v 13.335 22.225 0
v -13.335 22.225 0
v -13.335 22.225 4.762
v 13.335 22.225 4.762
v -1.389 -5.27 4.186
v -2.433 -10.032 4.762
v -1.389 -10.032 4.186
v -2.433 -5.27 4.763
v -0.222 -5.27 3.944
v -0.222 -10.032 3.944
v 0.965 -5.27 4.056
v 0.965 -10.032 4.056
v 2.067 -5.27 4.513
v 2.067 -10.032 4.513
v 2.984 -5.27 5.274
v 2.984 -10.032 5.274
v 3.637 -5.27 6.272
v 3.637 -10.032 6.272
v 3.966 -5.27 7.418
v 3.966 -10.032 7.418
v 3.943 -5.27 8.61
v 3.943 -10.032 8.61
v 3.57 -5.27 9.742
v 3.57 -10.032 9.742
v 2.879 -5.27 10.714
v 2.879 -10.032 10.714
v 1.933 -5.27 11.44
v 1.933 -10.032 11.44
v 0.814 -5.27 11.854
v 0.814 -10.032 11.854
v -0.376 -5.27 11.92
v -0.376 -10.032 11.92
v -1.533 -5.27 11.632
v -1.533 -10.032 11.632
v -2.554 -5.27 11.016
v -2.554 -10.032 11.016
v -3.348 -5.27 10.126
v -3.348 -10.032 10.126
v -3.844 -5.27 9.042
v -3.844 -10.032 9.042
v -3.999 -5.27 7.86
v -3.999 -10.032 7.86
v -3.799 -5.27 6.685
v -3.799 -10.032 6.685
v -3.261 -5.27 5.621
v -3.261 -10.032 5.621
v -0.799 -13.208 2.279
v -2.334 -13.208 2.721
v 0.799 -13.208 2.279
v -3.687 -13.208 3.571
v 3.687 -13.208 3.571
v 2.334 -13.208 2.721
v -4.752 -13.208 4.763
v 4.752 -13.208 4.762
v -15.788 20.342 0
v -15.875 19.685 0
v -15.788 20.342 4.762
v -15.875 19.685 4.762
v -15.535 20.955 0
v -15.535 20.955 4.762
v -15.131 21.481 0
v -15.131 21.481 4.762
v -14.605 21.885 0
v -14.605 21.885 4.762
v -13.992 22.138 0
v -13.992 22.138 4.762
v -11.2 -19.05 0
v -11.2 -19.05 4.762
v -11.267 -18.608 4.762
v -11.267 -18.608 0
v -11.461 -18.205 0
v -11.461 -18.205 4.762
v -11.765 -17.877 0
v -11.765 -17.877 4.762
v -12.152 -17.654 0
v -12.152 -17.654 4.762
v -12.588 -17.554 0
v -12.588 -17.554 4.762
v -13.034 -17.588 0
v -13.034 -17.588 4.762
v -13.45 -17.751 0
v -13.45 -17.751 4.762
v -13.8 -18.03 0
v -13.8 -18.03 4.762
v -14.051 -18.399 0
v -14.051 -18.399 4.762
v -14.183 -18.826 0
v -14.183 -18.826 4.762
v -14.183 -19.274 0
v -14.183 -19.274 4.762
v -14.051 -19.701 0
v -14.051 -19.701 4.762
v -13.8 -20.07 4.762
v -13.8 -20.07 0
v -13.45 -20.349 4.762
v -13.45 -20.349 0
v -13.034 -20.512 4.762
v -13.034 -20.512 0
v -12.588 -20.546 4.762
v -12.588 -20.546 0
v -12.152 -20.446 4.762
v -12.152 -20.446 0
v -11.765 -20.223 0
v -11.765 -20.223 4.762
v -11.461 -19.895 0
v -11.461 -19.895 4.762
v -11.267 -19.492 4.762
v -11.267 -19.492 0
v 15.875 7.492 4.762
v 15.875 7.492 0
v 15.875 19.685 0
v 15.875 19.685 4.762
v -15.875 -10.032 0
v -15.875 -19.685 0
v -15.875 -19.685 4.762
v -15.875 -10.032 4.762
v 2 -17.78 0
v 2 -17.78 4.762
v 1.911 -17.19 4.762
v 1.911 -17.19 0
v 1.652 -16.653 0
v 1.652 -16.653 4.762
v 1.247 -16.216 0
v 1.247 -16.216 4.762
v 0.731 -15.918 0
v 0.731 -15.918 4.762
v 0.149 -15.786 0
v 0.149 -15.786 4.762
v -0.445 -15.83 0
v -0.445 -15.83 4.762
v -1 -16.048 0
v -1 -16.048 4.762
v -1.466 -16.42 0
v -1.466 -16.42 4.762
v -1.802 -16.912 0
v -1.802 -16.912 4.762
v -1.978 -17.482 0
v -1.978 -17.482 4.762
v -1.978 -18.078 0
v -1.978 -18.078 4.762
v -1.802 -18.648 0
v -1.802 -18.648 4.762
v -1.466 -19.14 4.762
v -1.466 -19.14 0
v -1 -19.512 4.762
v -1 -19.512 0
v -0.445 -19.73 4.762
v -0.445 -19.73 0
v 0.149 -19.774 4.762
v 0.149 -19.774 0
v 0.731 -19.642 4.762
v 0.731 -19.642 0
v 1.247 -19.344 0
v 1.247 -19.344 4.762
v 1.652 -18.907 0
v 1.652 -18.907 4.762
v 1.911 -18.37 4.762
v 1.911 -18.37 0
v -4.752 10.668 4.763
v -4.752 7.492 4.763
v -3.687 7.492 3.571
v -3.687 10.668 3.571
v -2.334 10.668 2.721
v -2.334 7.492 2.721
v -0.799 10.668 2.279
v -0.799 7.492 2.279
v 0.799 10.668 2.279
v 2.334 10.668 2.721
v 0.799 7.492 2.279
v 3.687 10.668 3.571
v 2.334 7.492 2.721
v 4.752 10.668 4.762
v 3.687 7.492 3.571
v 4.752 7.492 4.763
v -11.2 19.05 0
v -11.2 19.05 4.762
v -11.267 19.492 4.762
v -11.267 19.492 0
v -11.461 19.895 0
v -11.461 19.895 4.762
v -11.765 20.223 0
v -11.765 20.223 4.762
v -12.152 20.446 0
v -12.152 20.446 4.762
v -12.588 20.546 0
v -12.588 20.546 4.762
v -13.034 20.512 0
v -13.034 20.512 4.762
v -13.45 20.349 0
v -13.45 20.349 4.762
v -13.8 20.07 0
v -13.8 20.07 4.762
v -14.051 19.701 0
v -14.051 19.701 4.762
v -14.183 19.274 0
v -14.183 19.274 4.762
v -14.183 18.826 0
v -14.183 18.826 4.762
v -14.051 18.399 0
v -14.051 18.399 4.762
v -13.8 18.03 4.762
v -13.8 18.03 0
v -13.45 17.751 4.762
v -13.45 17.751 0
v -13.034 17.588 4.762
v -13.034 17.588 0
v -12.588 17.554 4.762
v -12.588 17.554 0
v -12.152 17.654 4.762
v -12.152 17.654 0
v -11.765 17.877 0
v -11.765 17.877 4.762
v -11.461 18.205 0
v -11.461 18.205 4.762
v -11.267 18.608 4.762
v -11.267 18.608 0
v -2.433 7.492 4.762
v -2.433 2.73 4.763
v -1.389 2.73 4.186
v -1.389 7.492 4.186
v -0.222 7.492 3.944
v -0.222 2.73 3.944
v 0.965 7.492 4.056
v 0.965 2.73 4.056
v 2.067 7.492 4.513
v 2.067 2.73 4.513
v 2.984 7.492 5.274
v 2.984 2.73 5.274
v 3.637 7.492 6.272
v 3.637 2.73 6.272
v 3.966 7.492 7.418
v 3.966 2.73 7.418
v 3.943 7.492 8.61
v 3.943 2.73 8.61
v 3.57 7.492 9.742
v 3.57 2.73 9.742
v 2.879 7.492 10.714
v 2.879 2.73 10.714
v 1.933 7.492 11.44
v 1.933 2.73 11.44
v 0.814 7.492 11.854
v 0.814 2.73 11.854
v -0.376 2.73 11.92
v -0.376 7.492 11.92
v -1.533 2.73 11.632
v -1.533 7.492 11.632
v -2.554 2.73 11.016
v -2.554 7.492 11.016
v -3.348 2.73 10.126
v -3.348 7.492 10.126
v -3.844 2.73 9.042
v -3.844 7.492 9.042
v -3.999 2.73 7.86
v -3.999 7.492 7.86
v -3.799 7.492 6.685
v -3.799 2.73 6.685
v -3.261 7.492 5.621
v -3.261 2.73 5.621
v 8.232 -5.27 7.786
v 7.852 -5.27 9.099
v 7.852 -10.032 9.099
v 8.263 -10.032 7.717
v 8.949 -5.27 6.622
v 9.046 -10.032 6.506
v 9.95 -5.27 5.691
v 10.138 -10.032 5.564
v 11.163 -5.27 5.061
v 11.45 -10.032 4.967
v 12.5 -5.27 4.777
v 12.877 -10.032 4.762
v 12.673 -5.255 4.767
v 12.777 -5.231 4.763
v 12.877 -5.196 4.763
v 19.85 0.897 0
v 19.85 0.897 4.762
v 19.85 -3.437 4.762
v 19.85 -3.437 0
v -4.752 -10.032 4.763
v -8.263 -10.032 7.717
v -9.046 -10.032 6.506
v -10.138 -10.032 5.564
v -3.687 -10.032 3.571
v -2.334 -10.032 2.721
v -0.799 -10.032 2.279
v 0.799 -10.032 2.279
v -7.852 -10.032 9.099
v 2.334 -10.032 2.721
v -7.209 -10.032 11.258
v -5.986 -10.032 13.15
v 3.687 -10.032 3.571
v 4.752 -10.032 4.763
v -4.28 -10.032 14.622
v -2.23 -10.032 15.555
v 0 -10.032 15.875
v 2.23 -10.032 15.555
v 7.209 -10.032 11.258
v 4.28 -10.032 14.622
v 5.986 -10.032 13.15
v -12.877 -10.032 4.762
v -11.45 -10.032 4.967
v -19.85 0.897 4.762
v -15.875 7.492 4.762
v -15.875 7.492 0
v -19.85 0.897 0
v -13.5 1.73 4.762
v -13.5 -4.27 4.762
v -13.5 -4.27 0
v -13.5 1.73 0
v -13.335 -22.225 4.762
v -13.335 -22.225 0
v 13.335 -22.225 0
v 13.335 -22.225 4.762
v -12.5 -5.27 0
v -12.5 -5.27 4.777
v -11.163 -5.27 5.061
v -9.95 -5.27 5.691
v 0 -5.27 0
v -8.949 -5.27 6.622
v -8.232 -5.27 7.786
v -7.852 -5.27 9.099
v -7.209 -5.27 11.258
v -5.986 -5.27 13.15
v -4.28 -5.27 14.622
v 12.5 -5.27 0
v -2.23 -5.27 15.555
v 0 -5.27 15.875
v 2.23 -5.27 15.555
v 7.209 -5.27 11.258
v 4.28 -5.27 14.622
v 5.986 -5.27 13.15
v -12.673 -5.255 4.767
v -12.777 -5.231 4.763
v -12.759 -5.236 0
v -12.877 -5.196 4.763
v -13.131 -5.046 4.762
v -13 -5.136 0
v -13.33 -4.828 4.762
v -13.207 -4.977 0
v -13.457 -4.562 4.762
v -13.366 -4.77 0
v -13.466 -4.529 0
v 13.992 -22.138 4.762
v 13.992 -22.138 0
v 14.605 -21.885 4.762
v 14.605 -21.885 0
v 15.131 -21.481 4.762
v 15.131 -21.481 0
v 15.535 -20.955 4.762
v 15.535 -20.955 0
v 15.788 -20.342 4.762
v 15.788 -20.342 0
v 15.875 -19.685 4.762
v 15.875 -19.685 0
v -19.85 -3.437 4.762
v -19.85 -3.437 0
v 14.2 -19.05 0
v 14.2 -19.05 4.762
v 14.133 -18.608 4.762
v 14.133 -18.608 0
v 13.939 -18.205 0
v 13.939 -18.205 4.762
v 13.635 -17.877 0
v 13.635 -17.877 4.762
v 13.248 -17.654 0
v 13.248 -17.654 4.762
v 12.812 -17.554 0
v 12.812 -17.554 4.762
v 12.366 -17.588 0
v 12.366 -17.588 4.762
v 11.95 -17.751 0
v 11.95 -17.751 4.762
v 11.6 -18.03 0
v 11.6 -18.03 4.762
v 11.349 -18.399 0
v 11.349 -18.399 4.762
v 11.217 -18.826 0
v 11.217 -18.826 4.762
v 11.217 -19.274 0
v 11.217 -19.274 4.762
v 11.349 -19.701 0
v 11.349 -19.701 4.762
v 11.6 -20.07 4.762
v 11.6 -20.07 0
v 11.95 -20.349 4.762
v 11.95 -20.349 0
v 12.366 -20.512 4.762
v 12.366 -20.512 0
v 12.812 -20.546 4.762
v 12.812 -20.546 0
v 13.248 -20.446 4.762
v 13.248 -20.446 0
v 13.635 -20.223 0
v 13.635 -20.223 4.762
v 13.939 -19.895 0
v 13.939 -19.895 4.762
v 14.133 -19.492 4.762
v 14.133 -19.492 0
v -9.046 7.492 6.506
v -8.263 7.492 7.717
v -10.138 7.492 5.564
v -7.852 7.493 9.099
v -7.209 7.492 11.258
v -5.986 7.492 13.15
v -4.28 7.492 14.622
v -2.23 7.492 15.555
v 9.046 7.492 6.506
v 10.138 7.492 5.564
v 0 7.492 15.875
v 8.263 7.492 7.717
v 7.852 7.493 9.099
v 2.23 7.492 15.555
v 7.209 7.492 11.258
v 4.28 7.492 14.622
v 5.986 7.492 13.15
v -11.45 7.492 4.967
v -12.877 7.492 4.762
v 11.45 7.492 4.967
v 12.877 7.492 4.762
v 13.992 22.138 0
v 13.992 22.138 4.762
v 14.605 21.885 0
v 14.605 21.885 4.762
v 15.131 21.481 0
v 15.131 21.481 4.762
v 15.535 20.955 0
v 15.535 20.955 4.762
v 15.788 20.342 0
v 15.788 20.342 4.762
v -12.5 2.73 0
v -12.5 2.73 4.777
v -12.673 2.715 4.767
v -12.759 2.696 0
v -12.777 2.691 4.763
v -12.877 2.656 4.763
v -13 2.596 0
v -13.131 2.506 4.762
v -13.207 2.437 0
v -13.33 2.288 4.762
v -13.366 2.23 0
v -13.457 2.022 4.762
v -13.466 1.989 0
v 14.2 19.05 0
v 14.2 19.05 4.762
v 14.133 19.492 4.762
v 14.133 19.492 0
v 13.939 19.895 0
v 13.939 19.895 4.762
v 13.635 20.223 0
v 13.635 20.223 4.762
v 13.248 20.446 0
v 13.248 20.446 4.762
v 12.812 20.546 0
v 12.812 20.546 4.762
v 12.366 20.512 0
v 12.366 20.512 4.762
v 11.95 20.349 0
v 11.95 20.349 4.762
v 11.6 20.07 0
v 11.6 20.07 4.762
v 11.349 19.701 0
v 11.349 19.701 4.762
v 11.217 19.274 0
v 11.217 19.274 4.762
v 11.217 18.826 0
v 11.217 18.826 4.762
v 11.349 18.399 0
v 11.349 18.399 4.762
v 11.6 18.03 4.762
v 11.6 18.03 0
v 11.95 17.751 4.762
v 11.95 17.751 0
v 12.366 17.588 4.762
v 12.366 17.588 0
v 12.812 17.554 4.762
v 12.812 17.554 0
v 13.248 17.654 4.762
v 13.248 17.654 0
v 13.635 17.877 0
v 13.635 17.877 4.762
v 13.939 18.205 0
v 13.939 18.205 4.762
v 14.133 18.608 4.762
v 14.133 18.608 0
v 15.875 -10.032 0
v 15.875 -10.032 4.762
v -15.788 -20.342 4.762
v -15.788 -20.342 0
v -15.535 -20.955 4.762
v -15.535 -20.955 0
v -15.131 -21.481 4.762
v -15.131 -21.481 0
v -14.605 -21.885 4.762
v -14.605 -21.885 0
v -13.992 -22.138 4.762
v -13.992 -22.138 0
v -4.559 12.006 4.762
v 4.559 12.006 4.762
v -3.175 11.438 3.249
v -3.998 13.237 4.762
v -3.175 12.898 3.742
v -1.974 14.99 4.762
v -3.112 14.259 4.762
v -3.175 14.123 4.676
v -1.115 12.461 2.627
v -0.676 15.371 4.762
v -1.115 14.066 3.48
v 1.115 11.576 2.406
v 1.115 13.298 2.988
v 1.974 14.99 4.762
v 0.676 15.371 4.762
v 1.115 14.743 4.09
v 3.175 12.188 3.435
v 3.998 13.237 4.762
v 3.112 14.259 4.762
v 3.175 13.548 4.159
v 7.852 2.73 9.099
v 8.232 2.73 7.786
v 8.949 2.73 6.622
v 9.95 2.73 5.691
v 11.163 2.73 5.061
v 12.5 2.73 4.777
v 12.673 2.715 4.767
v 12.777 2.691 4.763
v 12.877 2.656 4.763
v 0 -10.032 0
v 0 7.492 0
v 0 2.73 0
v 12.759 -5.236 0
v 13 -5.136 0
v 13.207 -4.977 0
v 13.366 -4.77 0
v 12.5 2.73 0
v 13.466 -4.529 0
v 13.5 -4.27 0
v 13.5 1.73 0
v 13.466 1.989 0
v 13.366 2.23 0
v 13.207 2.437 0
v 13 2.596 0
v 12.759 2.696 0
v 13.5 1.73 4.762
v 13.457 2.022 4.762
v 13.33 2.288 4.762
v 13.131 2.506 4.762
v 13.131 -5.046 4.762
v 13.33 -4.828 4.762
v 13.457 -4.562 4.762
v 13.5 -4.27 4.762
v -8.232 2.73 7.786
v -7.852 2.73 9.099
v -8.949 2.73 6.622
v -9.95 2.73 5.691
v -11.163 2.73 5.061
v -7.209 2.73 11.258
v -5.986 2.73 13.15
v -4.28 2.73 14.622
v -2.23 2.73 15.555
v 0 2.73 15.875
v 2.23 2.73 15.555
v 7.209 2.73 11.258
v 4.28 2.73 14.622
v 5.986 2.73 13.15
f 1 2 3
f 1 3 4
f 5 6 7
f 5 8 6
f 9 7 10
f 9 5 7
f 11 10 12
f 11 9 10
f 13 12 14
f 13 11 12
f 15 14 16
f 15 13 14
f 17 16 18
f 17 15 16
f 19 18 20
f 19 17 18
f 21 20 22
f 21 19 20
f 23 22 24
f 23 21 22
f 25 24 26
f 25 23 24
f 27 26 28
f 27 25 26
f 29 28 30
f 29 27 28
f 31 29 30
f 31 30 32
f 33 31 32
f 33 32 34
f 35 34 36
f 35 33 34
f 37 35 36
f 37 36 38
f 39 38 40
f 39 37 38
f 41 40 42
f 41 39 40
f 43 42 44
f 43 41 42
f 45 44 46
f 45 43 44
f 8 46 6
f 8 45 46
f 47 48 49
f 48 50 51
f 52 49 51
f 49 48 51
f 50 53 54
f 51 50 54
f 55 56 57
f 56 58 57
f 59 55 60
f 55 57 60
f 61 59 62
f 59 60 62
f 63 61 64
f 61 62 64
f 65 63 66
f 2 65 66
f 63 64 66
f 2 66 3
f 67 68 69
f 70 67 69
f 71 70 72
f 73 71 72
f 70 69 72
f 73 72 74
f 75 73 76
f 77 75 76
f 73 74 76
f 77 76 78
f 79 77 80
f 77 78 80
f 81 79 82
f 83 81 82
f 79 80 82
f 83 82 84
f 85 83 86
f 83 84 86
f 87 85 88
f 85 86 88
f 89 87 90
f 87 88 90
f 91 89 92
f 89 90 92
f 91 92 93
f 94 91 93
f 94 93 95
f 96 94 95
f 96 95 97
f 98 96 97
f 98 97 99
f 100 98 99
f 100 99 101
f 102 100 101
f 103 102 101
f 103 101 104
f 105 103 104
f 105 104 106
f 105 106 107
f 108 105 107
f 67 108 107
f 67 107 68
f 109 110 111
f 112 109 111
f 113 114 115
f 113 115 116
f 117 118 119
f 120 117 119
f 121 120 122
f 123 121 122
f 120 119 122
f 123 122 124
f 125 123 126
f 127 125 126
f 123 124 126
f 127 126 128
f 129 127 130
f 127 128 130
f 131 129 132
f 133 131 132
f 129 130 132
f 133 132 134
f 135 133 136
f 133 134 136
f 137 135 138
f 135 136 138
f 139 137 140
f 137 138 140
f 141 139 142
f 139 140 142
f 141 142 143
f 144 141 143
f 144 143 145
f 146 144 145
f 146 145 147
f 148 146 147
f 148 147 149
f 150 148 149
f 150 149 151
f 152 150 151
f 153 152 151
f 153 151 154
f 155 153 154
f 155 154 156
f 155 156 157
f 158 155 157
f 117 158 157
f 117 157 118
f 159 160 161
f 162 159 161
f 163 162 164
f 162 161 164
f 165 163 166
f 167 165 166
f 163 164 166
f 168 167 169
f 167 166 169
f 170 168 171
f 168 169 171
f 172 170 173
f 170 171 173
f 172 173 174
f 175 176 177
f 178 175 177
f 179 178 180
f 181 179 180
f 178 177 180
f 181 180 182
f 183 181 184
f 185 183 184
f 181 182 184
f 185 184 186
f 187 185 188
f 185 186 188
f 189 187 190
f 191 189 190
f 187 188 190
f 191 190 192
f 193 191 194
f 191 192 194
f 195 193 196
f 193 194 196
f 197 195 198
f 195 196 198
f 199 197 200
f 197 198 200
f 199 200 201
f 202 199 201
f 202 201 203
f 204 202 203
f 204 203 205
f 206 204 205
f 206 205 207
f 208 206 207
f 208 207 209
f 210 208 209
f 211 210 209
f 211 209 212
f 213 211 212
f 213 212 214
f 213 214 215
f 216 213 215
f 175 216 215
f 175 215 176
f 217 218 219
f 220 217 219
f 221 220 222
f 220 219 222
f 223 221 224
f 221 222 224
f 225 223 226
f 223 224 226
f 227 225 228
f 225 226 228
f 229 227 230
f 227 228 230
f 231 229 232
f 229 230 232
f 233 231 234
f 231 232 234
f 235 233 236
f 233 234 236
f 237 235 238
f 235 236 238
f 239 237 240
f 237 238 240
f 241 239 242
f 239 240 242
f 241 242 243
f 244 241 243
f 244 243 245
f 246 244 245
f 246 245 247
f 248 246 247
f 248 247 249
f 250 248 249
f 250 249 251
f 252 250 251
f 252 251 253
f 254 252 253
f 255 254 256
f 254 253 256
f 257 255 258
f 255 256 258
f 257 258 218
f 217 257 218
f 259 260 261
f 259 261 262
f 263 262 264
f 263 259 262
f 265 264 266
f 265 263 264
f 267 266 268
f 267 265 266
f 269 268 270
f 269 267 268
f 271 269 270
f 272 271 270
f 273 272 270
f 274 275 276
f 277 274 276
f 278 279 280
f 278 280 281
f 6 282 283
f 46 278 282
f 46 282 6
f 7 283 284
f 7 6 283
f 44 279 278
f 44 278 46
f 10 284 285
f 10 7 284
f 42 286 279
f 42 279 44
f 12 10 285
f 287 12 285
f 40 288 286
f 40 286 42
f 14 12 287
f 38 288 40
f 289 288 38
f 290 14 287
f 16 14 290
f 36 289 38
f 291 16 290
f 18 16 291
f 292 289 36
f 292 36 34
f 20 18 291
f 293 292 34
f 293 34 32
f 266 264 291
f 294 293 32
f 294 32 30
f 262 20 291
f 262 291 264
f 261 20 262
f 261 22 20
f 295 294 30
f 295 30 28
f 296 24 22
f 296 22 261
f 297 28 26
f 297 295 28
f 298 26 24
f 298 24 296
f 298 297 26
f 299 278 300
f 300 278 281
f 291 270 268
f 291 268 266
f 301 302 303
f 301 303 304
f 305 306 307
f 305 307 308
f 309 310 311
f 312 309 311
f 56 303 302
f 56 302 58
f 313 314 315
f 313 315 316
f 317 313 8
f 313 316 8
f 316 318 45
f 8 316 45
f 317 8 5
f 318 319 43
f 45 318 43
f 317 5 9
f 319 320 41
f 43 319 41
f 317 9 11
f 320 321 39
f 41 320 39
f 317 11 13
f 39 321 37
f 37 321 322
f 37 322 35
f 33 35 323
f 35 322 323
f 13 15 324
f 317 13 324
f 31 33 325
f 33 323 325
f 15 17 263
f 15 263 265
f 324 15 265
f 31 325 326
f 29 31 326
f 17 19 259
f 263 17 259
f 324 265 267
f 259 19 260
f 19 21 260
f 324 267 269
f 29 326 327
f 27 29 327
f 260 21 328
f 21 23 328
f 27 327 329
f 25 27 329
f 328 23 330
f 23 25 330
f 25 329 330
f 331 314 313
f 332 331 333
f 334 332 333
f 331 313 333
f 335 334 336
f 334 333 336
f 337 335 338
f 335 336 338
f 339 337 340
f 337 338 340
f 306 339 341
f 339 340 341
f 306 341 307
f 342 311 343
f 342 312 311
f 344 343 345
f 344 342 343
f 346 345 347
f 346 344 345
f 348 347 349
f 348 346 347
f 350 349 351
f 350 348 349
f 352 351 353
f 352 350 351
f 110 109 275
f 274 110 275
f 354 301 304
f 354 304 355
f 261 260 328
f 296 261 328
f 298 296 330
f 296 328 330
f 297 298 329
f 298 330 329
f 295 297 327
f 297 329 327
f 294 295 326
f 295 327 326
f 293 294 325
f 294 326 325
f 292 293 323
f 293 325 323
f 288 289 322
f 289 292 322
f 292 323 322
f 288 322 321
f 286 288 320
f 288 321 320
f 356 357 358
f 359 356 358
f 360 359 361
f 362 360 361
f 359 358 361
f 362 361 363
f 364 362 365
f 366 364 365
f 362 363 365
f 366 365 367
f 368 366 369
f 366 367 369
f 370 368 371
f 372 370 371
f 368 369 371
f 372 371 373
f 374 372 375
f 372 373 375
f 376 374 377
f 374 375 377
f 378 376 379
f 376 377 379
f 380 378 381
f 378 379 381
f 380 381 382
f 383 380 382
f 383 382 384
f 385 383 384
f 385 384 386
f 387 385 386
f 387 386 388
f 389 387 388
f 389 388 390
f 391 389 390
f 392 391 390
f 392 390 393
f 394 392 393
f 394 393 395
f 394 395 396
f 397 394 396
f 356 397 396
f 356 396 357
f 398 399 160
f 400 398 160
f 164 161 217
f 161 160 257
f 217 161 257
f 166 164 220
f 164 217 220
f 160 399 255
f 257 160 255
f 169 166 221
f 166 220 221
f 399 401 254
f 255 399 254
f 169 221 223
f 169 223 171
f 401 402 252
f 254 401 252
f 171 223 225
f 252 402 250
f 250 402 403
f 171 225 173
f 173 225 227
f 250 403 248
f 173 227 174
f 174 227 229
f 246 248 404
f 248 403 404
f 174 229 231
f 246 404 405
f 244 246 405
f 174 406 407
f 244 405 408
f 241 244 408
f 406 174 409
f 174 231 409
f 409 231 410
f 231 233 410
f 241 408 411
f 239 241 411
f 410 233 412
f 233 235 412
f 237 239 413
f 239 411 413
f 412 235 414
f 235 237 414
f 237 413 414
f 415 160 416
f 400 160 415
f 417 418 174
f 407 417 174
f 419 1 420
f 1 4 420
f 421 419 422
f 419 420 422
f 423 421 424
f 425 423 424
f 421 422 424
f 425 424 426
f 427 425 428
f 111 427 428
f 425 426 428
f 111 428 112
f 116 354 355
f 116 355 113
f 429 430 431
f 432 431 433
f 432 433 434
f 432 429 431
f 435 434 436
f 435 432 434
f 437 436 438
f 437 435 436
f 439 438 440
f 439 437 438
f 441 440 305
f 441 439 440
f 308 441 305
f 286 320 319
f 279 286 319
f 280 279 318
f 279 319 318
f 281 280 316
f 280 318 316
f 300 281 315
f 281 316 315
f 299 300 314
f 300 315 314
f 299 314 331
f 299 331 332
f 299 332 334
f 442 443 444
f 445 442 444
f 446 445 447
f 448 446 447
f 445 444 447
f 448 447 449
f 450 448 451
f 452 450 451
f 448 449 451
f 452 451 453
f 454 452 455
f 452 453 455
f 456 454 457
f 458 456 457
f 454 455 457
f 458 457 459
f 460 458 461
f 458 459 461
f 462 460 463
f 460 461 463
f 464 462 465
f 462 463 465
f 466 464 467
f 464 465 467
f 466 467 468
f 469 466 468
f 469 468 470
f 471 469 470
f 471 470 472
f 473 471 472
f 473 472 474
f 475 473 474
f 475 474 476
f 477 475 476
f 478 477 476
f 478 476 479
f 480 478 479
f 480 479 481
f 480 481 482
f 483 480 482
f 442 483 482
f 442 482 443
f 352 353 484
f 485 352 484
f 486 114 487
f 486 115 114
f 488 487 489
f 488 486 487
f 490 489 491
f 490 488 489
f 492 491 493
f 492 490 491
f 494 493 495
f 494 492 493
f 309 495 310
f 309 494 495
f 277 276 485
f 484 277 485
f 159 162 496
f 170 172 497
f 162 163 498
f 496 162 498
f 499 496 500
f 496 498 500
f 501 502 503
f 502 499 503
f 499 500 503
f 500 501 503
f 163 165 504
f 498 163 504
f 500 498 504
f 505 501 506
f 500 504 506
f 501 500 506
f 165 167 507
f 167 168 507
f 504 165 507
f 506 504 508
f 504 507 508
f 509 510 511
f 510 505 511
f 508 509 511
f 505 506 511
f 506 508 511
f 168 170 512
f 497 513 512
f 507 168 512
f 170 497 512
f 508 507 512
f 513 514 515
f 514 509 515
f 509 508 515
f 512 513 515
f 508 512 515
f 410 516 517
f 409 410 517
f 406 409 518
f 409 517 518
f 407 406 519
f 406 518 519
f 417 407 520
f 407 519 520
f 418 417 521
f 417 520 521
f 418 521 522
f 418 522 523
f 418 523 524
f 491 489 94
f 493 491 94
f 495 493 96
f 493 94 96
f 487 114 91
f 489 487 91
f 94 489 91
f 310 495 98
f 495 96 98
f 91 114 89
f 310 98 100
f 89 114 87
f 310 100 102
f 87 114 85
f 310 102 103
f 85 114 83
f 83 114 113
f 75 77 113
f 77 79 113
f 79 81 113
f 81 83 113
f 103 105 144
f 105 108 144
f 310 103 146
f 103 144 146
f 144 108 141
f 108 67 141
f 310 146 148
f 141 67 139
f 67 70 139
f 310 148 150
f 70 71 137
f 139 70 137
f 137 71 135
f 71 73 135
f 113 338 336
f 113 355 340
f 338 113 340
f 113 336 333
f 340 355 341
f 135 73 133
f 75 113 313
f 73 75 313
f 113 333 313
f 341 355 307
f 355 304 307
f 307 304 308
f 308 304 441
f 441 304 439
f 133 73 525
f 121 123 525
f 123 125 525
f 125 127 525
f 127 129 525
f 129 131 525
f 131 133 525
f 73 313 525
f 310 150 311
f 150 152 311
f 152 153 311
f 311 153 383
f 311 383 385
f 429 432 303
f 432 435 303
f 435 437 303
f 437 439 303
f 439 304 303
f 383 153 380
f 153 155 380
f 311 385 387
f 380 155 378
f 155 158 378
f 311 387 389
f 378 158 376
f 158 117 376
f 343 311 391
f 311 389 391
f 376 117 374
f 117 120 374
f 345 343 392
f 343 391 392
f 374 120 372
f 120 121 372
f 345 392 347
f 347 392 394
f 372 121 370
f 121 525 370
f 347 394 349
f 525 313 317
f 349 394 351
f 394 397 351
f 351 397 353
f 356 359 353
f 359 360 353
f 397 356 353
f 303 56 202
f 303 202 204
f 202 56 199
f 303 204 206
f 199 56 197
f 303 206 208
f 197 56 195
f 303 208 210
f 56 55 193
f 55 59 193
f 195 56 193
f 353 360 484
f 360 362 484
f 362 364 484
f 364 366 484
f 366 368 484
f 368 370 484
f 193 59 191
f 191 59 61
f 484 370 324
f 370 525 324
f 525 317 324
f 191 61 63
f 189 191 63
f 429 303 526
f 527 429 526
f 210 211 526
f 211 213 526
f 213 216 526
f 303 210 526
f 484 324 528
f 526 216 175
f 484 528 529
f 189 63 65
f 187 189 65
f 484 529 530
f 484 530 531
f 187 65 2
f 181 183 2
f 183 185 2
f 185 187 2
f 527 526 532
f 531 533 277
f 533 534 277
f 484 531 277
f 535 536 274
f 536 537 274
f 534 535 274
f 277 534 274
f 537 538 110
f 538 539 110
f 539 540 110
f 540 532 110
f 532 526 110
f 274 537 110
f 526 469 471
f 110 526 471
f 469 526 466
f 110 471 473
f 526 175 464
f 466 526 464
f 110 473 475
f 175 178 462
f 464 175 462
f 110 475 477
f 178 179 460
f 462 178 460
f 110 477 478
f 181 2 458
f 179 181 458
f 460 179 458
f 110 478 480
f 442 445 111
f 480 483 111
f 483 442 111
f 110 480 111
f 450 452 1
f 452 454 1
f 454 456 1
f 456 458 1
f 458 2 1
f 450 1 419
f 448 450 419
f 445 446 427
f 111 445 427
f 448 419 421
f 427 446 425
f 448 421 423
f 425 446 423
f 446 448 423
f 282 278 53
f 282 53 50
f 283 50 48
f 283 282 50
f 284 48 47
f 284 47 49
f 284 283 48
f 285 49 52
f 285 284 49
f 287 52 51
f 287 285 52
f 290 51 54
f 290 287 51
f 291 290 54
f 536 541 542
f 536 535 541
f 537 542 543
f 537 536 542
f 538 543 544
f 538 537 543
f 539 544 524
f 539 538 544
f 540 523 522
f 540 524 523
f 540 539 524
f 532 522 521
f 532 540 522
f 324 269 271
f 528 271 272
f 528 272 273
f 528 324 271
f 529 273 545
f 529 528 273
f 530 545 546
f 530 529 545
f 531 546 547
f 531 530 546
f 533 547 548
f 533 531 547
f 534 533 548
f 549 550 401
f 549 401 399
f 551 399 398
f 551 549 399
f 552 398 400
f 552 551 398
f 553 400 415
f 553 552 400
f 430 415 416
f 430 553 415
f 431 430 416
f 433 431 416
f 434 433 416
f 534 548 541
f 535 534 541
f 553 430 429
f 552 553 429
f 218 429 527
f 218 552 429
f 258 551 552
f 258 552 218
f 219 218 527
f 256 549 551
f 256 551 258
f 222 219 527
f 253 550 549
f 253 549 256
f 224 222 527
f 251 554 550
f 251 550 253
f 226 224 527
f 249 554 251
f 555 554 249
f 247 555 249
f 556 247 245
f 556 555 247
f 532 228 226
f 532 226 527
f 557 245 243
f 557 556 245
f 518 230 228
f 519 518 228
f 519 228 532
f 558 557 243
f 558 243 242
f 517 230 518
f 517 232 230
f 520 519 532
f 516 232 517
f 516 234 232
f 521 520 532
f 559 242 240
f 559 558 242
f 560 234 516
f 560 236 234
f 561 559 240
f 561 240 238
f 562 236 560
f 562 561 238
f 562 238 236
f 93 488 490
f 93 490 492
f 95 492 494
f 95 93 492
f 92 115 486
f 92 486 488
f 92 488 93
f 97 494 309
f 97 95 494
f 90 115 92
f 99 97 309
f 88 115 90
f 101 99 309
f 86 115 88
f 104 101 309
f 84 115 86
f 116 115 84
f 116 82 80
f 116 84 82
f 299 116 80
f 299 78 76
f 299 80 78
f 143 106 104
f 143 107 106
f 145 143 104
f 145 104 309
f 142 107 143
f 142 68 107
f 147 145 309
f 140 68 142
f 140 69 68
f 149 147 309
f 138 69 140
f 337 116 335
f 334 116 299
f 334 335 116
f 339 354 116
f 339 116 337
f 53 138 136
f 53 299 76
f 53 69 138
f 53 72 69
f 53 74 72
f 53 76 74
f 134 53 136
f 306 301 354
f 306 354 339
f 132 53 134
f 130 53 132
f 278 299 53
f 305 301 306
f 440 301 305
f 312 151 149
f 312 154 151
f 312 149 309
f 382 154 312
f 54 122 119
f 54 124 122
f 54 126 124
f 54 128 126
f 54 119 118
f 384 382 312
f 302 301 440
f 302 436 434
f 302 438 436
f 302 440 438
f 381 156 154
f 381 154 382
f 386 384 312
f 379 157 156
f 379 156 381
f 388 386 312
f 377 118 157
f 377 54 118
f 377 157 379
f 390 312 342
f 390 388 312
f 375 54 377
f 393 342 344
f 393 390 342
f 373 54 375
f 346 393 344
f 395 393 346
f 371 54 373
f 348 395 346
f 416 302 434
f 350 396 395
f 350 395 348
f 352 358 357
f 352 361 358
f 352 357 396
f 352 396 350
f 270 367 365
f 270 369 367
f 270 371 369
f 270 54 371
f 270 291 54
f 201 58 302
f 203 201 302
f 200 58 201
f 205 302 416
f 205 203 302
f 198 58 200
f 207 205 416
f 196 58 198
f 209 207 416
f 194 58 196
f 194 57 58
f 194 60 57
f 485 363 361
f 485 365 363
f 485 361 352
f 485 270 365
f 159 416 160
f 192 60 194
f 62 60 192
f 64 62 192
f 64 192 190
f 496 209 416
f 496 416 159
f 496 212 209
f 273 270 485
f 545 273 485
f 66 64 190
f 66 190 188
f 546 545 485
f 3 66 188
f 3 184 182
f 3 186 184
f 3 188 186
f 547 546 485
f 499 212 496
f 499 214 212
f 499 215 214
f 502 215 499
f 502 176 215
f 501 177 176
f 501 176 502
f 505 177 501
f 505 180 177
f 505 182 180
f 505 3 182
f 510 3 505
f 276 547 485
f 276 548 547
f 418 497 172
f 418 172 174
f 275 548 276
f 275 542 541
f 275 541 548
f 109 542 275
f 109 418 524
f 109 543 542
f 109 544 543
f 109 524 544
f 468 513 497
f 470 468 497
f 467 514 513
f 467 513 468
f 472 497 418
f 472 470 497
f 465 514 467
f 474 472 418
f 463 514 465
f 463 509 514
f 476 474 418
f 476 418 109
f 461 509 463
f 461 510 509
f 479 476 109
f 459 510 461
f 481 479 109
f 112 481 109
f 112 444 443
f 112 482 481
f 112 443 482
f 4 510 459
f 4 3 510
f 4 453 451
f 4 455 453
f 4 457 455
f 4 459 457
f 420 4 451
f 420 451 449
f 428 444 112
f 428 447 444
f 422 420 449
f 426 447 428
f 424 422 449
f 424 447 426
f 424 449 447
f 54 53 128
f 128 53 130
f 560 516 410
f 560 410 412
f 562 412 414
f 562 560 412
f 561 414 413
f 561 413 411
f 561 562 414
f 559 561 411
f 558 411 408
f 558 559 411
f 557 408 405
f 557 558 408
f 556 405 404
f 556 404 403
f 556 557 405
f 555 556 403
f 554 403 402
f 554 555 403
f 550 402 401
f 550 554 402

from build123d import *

# Parameters (mm, degrees)
SKETCH1_W            = 31.75
SKETCH1_H            = 44.45
BOSS_EXTRUDE1_DEPTH  = 4.7625
SKETCH2_R            = 1.5
SKETCH2_R_2          = 2
CUT_EXTRUDE1_DEPTH   = 5.7625
FILLET1_R            = 2.54
SKETCH3_W            = 27
SKETCH3_H            = 8
CUT_EXTRUDE2_DEPTH   = 5.7625
FILLET2_R            = 1
SKETCH4_R            = 7.9375
SKETCH4_R_2          = 4
BOSS_EXTRUDE2_DEPTH  = 4.7625
SKETCH5_R            = 4
CUT_EXTRUDE3_DEPTH   = 4.7625
SKETCH6_R            = 5.715
CUT_EXTRUDE4_DEPTH   = 3.175
CUT_REVOLVE1_ANGLE   = 90
FILLET3_R            = 5.08
FILLET3_OF_MIRROR1_R = 5.08
BOSS_EXTRUDE3_DEPTH  = 4.7625


with BuildPart() as part:
    # Sketch1 → Boss-Extrude1 (new body)
    with BuildSketch(Plane.XY):
        Rectangle(SKETCH1_W, SKETCH1_H)
    extrude(amount=BOSS_EXTRUDE1_DEPTH)

    # Sketch2 → Cut-Extrude1 (cut, through all)
    with BuildSketch(Plane.XY.offset(4.7625)):
        with Locations((-12.7, 19.05)):
            Circle(SKETCH2_R)
        with Locations((12.7, 19.05)):
            Circle(SKETCH2_R)
        with Locations((0, -17.78)):
            Circle(SKETCH2_R_2)
        with Locations((12.7, -19.05)):
            Circle(SKETCH2_R)
        with Locations((-12.7, -19.05)):
            Circle(SKETCH2_R)
    extrude(amount=-CUT_EXTRUDE1_DEPTH, mode=Mode.SUBTRACT)

    # Fillet1
    fillet1_edges = [part.edges().sort_by_distance(p)[0] for p in [
        (15.875, -22.225, 2.38125),
        (-15.875, -22.225, 2.38125),
        (-15.875, 22.225, 2.38125),
        (15.875, 22.225, 2.38125),
    ]]
    fillet(fillet1_edges, radius=FILLET1_R)

    # Sketch3 → Cut-Extrude2 (cut, through all)
    with BuildSketch(Plane.XY.offset(4.7625)):
        with Locations((0, -1.27)):
            Rectangle(SKETCH3_W, SKETCH3_H)
    extrude(amount=-CUT_EXTRUDE2_DEPTH, mode=Mode.SUBTRACT)

    # Fillet2
    fillet2_edges = [part.edges().sort_by_distance(p)[0] for p in [
        (13.5, 2.73, 2.38125),
        (13.5, -5.27, 2.38125),
        (-13.5, -5.27, 2.38125),
        (-13.5, 2.73, 2.38125),
    ]]
    fillet(fillet2_edges, radius=FILLET2_R)

    # Sketch4 → Boss-Extrude2 (add)
    with BuildSketch(Plane.XZ.offset(-2.73)):
        with Locations((0, 7.9375)):
            Circle(SKETCH4_R)
        with Locations((0, 7.9375)):
            Circle(SKETCH4_R_2, mode=Mode.SUBTRACT)
    boss_extrude2 = extrude(amount=-BOSS_EXTRUDE2_DEPTH)

    # Sketch5 → Cut-Extrude3 (cut)
    with BuildSketch(Plane.XZ.offset(-2.73)):
        with Locations((0, 7.9375)):
            Circle(SKETCH5_R)
    cut_extrude3 = extrude(amount=-CUT_EXTRUDE3_DEPTH, mode=Mode.SUBTRACT)

    # Sketch6 → Cut-Extrude4 (cut)
    with BuildSketch(Plane.XZ.offset(-7.4925)):
        with Locations((0, 7.9375)):
            Circle(SKETCH6_R)
    cut_extrude4 = extrude(amount=-CUT_EXTRUDE4_DEPTH, mode=Mode.SUBTRACT)

    # Sketch7 → Cut-Revolve1 (revolve, cut)
    with BuildSketch(Plane.XZ.offset(-10.6675)):
        with BuildLine():
            Line((5.715, 7.9375), (-5.715, 7.9375))
            ThreePointArc((-5.715, 7.9375), (0, 2.2225), (5.715, 7.9375))
        make_face()
    revolve(axis=Axis((5.715, 10.6675, 7.9375), (1, 0, 0)), revolution_arc=CUT_REVOLVE1_ANGLE, mode=Mode.SUBTRACT)

    # Fillet3
    fillet3_edges = [part.edges().sort_by_distance(p)[0] for p in [
        (7.274838916, 5.11125, 4.7625),
        (-7.274838916, 5.11125, 4.7625),
    ]]
    fillet(fillet3_edges, radius=FILLET3_R)

    # Mirror1: Boss-Extrude2, Cut-Extrude3, Cut-Extrude4 across plane
    add(boss_extrude2.mirror(Plane(origin=(0, -1.27, 0), x_dir=(0, 0, 1), z_dir=(0, -1, 0))))
    add(cut_extrude3.mirror(Plane(origin=(0, -1.27, 0), x_dir=(0, 0, 1), z_dir=(0, -1, 0))), mode=Mode.SUBTRACT)
    add(cut_extrude4.mirror(Plane(origin=(0, -1.27, 0), x_dir=(0, 0, 1), z_dir=(0, -1, 0))), mode=Mode.SUBTRACT)

    # Fillet3 of Mirror1
    fillet3_of_mirror1_edges = [part.edges().sort_by_distance(p)[0] for p in [
        (7.274838916, -7.65125, 4.7625),
        (-7.274838916, -7.65125, 4.7625),
    ]]
    fillet(fillet3_of_mirror1_edges, radius=FILLET3_OF_MIRROR1_R)

    # Sketch9 → Boss-Extrude3 (add)
    with BuildSketch(Plane.XY.offset(4.7625)):
        Polygon((-15.875, 7.4925), (-19.85, 0.897185125), (-19.85, -3.437185125), (-15.875, -10.0325), align=None)
    boss_extrude3 = extrude(amount=-BOSS_EXTRUDE3_DEPTH)

    # Mirror2: Boss-Extrude3 across plane
    add(boss_extrude3.mirror(Plane(origin=(0, 0, 0), x_dir=(0, 0, 1), z_dir=(1, 0, 0))))


solid = part.part
